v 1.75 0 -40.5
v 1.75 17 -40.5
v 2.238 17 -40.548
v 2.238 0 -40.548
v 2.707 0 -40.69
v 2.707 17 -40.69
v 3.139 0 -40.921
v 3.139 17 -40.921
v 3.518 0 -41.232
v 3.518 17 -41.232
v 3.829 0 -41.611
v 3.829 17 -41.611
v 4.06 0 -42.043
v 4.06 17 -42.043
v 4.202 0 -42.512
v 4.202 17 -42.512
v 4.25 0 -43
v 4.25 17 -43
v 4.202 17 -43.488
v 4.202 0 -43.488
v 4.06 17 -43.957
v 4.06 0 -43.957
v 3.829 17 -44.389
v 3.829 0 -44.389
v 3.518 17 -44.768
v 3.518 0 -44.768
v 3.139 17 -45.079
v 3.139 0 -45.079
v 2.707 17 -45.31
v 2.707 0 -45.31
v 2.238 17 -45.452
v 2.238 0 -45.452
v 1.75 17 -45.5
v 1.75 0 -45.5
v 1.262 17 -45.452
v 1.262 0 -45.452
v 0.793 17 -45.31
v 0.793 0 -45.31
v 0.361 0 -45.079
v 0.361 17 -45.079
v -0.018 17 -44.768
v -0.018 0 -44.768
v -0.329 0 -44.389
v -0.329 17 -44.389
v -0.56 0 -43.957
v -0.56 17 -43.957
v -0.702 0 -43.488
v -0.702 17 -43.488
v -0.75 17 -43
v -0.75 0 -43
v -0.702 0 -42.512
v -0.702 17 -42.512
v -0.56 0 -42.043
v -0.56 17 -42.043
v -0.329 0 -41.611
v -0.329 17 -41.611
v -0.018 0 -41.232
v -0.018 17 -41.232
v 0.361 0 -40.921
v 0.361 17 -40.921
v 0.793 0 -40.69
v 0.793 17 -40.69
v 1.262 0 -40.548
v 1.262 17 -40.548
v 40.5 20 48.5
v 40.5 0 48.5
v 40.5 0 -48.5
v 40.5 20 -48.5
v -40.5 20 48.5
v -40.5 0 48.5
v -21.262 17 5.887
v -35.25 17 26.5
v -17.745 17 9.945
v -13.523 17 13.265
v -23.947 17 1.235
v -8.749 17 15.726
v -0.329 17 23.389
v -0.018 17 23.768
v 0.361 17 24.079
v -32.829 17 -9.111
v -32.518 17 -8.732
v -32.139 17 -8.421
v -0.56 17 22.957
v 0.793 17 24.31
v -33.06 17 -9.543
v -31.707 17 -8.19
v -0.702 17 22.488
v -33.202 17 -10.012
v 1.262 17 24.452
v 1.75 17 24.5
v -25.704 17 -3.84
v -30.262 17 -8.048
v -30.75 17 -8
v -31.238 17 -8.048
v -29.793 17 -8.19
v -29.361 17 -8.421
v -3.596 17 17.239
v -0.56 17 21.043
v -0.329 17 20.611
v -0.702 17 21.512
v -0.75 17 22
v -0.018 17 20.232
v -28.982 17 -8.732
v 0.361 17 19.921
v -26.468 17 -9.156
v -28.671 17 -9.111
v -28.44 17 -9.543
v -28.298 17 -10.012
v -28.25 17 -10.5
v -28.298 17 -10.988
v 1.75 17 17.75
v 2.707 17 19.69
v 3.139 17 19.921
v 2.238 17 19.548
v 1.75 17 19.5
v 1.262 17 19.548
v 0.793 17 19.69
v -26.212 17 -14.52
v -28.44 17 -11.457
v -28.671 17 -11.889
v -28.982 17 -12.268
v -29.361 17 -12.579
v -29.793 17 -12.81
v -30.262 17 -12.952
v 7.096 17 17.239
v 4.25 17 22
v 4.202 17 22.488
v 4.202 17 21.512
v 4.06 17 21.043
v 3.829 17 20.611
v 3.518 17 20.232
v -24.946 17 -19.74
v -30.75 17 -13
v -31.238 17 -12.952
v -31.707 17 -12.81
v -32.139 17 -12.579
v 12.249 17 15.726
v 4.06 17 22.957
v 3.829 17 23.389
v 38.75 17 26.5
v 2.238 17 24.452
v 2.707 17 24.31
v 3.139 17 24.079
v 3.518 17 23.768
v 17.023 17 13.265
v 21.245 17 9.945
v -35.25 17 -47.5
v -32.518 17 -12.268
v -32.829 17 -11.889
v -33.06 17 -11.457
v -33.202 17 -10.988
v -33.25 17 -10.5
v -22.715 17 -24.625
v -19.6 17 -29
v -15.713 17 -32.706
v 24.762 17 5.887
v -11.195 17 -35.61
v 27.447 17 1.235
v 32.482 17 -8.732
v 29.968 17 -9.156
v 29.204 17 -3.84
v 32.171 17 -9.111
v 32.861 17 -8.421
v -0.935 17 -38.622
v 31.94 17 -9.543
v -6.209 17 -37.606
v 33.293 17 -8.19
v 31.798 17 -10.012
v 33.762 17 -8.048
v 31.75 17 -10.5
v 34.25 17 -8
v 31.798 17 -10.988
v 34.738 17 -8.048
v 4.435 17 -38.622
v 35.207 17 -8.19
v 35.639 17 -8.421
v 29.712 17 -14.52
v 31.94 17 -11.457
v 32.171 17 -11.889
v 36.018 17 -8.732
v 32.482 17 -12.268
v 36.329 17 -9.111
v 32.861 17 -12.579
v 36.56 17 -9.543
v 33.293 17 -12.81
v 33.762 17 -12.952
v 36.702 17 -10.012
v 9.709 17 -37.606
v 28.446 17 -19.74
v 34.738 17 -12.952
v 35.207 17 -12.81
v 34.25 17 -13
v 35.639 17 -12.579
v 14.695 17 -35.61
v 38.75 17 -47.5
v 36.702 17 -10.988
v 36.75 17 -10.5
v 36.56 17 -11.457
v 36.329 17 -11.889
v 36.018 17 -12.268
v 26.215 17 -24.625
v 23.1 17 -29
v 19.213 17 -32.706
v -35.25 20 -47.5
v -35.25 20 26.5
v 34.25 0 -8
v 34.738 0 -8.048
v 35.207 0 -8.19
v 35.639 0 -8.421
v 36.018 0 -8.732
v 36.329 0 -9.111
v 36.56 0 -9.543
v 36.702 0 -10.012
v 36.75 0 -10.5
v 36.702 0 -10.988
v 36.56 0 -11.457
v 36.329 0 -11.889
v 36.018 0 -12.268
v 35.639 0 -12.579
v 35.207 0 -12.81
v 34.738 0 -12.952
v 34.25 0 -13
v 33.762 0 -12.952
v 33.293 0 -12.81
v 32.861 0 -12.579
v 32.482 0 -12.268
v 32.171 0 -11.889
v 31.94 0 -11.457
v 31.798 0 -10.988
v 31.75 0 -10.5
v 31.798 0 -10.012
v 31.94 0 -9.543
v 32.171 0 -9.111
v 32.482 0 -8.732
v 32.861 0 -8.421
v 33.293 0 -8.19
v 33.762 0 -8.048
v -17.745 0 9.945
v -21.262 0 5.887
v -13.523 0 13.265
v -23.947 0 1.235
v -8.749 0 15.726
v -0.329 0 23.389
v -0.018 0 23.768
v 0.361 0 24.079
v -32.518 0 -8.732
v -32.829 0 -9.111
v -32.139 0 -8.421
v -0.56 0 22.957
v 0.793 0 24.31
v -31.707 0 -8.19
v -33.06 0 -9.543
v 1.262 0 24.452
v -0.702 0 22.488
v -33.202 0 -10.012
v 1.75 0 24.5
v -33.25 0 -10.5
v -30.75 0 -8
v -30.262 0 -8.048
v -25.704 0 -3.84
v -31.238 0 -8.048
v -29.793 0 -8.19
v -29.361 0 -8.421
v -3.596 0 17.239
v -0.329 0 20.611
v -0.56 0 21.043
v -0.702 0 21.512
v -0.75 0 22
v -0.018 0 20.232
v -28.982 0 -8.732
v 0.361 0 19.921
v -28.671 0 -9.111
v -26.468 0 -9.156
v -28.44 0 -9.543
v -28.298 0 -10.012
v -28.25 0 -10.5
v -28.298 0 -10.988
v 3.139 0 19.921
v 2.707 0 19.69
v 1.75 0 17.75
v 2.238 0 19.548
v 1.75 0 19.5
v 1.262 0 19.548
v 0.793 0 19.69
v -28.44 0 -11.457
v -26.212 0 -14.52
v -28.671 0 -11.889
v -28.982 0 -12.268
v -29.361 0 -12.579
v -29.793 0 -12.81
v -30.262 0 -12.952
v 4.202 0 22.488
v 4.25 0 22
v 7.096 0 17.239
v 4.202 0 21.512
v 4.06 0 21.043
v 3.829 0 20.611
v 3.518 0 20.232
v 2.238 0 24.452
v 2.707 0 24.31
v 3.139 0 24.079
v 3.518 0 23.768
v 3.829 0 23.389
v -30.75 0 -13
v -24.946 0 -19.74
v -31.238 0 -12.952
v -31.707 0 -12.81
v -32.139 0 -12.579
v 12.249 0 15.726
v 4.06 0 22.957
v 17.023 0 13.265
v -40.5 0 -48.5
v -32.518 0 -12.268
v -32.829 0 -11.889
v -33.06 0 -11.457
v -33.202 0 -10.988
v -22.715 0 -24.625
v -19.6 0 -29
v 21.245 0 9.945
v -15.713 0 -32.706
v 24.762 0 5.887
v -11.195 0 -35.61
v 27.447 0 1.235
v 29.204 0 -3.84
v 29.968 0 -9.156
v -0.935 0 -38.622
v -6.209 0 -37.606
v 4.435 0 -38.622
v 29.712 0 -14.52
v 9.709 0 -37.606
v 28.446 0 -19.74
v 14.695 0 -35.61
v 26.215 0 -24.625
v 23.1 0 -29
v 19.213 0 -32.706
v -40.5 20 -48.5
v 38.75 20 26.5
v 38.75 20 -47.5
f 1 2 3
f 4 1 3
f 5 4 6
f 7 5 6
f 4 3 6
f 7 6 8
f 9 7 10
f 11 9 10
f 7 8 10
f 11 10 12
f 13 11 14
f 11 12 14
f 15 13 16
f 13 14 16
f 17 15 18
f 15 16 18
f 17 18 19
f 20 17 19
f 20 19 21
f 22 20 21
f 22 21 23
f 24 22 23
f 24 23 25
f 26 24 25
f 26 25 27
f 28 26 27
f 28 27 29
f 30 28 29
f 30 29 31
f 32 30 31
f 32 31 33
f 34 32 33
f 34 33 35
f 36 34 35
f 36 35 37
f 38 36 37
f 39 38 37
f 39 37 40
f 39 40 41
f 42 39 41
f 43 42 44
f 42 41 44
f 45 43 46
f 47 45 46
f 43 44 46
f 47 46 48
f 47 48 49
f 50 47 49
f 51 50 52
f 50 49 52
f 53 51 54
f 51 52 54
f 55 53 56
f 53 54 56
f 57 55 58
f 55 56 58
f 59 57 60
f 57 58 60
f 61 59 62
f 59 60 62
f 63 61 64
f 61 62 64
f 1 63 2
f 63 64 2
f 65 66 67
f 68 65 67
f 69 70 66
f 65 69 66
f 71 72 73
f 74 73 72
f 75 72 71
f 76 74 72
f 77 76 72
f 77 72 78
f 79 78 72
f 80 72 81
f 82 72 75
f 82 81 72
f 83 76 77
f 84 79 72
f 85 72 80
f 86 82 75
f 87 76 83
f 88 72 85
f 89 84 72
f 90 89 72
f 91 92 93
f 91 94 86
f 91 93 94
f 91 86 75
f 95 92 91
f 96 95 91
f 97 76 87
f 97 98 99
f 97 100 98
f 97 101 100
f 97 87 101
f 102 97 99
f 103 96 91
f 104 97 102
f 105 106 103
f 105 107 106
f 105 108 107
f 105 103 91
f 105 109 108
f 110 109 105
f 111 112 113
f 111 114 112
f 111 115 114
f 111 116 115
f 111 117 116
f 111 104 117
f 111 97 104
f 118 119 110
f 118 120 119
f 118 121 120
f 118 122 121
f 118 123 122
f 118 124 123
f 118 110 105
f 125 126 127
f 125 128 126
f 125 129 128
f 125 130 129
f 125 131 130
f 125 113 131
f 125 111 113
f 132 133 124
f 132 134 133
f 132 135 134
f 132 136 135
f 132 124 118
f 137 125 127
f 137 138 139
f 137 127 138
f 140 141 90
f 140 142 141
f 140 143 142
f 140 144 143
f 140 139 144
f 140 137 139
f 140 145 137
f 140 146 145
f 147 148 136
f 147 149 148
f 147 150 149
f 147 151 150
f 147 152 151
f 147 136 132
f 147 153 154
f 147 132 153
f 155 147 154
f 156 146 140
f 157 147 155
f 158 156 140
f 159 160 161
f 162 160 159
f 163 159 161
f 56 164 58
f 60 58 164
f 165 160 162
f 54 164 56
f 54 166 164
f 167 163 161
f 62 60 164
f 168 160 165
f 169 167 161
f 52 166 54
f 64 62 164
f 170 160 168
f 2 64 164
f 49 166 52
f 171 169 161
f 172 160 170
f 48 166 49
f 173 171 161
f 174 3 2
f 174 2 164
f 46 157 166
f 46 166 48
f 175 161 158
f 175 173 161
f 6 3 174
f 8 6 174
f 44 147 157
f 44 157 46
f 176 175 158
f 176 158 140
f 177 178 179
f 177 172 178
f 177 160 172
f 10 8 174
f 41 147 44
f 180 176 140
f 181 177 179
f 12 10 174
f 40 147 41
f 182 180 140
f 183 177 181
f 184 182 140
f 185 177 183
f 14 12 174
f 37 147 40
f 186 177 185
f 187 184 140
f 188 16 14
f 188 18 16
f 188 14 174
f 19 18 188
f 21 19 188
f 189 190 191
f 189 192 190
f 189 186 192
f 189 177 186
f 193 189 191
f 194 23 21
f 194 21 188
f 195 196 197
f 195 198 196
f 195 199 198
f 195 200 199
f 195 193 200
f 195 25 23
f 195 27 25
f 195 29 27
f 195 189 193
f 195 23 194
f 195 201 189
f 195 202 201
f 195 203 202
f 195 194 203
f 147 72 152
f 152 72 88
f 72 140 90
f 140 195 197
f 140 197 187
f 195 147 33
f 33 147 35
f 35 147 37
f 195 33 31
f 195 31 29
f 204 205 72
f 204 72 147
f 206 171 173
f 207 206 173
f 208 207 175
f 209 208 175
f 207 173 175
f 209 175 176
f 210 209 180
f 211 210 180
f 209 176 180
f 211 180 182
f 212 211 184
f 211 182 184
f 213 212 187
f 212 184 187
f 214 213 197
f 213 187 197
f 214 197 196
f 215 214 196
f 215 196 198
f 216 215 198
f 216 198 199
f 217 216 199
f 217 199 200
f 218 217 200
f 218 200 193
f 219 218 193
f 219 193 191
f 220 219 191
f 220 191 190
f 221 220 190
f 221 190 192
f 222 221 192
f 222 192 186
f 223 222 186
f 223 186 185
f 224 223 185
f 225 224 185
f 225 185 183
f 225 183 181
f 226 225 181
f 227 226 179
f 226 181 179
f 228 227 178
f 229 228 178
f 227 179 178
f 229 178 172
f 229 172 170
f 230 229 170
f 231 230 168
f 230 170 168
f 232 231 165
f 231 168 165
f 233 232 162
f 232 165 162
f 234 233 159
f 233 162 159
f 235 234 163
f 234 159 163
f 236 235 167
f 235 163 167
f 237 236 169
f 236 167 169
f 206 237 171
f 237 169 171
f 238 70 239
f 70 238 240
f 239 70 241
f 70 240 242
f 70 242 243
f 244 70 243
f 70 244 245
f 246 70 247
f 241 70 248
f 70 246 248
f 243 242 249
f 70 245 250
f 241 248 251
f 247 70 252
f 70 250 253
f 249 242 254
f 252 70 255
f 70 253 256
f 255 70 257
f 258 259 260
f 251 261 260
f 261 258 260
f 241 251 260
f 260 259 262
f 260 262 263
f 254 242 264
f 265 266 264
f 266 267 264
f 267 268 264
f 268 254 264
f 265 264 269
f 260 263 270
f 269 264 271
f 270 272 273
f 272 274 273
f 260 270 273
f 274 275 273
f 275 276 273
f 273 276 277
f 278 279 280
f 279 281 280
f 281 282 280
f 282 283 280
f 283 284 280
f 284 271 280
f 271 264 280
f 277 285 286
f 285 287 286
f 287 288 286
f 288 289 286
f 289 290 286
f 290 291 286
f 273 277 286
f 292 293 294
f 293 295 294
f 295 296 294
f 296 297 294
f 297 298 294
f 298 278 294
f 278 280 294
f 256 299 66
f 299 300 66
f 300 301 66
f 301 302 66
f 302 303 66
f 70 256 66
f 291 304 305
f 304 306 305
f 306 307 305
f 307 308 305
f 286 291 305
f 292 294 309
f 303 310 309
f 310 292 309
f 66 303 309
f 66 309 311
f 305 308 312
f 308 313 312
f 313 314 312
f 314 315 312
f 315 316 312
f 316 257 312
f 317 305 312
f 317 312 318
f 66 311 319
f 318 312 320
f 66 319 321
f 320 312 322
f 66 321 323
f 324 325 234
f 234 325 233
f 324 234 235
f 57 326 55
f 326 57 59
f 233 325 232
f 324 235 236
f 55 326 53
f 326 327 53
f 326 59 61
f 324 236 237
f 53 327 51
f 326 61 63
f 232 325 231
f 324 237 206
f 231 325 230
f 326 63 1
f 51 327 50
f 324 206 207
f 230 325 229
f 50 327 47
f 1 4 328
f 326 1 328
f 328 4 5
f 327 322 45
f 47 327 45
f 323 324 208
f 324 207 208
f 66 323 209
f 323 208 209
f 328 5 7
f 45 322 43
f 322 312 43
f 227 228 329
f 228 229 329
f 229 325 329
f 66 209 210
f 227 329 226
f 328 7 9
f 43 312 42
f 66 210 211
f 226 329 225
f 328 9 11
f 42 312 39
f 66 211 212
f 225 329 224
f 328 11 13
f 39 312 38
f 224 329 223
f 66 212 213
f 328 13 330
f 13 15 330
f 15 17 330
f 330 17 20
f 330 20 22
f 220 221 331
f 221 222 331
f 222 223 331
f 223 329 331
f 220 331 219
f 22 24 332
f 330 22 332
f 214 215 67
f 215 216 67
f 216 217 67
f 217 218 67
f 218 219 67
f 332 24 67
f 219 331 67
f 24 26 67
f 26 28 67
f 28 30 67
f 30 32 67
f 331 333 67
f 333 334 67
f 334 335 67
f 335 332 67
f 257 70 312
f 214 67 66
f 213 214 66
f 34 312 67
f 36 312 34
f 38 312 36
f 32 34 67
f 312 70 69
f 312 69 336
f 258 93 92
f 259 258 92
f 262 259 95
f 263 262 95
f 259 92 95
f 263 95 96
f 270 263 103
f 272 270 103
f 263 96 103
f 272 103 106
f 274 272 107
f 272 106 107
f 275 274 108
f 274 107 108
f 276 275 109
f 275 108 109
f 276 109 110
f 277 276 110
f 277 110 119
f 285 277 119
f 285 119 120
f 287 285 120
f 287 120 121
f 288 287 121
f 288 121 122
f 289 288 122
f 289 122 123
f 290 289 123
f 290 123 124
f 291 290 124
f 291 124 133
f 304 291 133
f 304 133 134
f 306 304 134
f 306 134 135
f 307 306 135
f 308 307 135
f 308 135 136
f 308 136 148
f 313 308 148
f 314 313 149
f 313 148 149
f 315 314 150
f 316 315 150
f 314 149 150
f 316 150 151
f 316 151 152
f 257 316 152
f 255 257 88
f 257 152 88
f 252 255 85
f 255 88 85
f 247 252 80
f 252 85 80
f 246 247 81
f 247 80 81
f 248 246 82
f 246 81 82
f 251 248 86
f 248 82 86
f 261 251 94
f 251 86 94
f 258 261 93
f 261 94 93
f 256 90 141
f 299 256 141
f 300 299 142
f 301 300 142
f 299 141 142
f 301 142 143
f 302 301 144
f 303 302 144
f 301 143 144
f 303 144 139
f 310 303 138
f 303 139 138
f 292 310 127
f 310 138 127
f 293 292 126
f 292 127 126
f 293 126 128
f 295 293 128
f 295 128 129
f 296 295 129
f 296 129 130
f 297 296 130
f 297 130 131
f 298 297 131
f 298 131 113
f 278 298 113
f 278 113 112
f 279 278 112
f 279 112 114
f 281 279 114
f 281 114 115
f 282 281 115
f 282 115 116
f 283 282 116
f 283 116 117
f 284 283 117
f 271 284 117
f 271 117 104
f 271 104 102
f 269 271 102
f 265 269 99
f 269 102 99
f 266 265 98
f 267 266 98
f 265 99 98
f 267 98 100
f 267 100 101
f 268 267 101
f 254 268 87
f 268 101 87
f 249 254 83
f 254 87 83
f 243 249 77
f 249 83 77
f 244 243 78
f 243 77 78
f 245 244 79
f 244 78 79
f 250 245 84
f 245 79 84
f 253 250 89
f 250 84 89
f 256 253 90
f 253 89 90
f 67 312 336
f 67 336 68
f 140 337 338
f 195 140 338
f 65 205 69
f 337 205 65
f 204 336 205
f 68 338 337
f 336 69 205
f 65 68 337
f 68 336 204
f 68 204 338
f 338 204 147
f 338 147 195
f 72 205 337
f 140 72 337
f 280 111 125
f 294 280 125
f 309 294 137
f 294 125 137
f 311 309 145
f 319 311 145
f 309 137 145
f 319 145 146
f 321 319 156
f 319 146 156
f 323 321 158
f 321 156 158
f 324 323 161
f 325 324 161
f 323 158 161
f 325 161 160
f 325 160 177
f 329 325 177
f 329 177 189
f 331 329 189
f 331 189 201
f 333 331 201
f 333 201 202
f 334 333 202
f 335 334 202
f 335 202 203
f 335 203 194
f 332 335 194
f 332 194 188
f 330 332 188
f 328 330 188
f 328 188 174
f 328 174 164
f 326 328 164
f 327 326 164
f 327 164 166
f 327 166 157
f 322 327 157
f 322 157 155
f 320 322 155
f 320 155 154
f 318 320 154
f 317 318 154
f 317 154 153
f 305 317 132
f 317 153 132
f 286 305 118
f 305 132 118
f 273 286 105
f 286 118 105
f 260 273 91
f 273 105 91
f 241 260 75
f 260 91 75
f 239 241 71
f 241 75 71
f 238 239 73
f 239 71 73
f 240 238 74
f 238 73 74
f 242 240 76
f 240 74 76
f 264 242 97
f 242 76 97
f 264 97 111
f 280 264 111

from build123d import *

# Parameters (mm, degrees)
SKETCH1_W           = 81
SKETCH1_H           = 97
BOSS_EXTRUDE1_DEPTH = 20
SKETCH2_R           = 28.25
CUT_EXTRUDE2_DEPTH  = 67.275938319
SKETCH5_W           = 74
SKETCH5_H           = 74
CUT_EXTRUDE3_DEPTH  = 3
SKETCH6_R           = 2.5
CUT_EXTRUDE4_DEPTH  = 66.433172015


with BuildPart() as part:
    # Sketch1 → Boss-Extrude1 (new body)
    with BuildSketch(Plane(origin=(0, 0, 0), x_dir=(1, 0, 0), z_dir=(0, 1, 0))):
        Rectangle(SKETCH1_W, SKETCH1_H)
    extrude(amount=BOSS_EXTRUDE1_DEPTH)

    # Sketch2 → Cut-Extrude2 (cut, through all)
    with BuildSketch(Plane(origin=(0, 20, 0), x_dir=(1, 0, 0), z_dir=(0, 1, 0))):
        with Locations(Location((1.75, 10.5, 0), (0, 0, 270))):
            Circle(SKETCH2_R)
    extrude(amount=-CUT_EXTRUDE2_DEPTH, mode=Mode.SUBTRACT)

    # Sketch5 → Cut-Extrude3 (cut)
    with BuildSketch(Plane(origin=(0, 20, 0), x_dir=(1, 0, 0), z_dir=(0, 1, 0))):
        with Locations((1.75, 10.5)):
            Rectangle(SKETCH5_W, SKETCH5_H)
    extrude(amount=-CUT_EXTRUDE3_DEPTH, mode=Mode.SUBTRACT)

    # Sketch6 → Cut-Extrude4 (cut, through all)
    with BuildSketch(Plane(origin=(0, 17, 0), x_dir=(1, 0, 0), z_dir=(0, 1, 0))):
        with Locations(Location((-30.75, 10.5, 0), (0, 0, 270))):
            Circle(SKETCH6_R)
        with Locations(Location((1.75, -22, 0), (0, 0, 270))):
            Circle(SKETCH6_R)
        with Locations(Location((34.25, 10.5, 0), (0, 0, 270))):
            Circle(SKETCH6_R)
        with Locations(Location((1.75, 43, 0), (0, 0, 270))):
            Circle(SKETCH6_R)
    extrude(amount=-CUT_EXTRUDE4_DEPTH, mode=Mode.SUBTRACT)


solid = part.part
